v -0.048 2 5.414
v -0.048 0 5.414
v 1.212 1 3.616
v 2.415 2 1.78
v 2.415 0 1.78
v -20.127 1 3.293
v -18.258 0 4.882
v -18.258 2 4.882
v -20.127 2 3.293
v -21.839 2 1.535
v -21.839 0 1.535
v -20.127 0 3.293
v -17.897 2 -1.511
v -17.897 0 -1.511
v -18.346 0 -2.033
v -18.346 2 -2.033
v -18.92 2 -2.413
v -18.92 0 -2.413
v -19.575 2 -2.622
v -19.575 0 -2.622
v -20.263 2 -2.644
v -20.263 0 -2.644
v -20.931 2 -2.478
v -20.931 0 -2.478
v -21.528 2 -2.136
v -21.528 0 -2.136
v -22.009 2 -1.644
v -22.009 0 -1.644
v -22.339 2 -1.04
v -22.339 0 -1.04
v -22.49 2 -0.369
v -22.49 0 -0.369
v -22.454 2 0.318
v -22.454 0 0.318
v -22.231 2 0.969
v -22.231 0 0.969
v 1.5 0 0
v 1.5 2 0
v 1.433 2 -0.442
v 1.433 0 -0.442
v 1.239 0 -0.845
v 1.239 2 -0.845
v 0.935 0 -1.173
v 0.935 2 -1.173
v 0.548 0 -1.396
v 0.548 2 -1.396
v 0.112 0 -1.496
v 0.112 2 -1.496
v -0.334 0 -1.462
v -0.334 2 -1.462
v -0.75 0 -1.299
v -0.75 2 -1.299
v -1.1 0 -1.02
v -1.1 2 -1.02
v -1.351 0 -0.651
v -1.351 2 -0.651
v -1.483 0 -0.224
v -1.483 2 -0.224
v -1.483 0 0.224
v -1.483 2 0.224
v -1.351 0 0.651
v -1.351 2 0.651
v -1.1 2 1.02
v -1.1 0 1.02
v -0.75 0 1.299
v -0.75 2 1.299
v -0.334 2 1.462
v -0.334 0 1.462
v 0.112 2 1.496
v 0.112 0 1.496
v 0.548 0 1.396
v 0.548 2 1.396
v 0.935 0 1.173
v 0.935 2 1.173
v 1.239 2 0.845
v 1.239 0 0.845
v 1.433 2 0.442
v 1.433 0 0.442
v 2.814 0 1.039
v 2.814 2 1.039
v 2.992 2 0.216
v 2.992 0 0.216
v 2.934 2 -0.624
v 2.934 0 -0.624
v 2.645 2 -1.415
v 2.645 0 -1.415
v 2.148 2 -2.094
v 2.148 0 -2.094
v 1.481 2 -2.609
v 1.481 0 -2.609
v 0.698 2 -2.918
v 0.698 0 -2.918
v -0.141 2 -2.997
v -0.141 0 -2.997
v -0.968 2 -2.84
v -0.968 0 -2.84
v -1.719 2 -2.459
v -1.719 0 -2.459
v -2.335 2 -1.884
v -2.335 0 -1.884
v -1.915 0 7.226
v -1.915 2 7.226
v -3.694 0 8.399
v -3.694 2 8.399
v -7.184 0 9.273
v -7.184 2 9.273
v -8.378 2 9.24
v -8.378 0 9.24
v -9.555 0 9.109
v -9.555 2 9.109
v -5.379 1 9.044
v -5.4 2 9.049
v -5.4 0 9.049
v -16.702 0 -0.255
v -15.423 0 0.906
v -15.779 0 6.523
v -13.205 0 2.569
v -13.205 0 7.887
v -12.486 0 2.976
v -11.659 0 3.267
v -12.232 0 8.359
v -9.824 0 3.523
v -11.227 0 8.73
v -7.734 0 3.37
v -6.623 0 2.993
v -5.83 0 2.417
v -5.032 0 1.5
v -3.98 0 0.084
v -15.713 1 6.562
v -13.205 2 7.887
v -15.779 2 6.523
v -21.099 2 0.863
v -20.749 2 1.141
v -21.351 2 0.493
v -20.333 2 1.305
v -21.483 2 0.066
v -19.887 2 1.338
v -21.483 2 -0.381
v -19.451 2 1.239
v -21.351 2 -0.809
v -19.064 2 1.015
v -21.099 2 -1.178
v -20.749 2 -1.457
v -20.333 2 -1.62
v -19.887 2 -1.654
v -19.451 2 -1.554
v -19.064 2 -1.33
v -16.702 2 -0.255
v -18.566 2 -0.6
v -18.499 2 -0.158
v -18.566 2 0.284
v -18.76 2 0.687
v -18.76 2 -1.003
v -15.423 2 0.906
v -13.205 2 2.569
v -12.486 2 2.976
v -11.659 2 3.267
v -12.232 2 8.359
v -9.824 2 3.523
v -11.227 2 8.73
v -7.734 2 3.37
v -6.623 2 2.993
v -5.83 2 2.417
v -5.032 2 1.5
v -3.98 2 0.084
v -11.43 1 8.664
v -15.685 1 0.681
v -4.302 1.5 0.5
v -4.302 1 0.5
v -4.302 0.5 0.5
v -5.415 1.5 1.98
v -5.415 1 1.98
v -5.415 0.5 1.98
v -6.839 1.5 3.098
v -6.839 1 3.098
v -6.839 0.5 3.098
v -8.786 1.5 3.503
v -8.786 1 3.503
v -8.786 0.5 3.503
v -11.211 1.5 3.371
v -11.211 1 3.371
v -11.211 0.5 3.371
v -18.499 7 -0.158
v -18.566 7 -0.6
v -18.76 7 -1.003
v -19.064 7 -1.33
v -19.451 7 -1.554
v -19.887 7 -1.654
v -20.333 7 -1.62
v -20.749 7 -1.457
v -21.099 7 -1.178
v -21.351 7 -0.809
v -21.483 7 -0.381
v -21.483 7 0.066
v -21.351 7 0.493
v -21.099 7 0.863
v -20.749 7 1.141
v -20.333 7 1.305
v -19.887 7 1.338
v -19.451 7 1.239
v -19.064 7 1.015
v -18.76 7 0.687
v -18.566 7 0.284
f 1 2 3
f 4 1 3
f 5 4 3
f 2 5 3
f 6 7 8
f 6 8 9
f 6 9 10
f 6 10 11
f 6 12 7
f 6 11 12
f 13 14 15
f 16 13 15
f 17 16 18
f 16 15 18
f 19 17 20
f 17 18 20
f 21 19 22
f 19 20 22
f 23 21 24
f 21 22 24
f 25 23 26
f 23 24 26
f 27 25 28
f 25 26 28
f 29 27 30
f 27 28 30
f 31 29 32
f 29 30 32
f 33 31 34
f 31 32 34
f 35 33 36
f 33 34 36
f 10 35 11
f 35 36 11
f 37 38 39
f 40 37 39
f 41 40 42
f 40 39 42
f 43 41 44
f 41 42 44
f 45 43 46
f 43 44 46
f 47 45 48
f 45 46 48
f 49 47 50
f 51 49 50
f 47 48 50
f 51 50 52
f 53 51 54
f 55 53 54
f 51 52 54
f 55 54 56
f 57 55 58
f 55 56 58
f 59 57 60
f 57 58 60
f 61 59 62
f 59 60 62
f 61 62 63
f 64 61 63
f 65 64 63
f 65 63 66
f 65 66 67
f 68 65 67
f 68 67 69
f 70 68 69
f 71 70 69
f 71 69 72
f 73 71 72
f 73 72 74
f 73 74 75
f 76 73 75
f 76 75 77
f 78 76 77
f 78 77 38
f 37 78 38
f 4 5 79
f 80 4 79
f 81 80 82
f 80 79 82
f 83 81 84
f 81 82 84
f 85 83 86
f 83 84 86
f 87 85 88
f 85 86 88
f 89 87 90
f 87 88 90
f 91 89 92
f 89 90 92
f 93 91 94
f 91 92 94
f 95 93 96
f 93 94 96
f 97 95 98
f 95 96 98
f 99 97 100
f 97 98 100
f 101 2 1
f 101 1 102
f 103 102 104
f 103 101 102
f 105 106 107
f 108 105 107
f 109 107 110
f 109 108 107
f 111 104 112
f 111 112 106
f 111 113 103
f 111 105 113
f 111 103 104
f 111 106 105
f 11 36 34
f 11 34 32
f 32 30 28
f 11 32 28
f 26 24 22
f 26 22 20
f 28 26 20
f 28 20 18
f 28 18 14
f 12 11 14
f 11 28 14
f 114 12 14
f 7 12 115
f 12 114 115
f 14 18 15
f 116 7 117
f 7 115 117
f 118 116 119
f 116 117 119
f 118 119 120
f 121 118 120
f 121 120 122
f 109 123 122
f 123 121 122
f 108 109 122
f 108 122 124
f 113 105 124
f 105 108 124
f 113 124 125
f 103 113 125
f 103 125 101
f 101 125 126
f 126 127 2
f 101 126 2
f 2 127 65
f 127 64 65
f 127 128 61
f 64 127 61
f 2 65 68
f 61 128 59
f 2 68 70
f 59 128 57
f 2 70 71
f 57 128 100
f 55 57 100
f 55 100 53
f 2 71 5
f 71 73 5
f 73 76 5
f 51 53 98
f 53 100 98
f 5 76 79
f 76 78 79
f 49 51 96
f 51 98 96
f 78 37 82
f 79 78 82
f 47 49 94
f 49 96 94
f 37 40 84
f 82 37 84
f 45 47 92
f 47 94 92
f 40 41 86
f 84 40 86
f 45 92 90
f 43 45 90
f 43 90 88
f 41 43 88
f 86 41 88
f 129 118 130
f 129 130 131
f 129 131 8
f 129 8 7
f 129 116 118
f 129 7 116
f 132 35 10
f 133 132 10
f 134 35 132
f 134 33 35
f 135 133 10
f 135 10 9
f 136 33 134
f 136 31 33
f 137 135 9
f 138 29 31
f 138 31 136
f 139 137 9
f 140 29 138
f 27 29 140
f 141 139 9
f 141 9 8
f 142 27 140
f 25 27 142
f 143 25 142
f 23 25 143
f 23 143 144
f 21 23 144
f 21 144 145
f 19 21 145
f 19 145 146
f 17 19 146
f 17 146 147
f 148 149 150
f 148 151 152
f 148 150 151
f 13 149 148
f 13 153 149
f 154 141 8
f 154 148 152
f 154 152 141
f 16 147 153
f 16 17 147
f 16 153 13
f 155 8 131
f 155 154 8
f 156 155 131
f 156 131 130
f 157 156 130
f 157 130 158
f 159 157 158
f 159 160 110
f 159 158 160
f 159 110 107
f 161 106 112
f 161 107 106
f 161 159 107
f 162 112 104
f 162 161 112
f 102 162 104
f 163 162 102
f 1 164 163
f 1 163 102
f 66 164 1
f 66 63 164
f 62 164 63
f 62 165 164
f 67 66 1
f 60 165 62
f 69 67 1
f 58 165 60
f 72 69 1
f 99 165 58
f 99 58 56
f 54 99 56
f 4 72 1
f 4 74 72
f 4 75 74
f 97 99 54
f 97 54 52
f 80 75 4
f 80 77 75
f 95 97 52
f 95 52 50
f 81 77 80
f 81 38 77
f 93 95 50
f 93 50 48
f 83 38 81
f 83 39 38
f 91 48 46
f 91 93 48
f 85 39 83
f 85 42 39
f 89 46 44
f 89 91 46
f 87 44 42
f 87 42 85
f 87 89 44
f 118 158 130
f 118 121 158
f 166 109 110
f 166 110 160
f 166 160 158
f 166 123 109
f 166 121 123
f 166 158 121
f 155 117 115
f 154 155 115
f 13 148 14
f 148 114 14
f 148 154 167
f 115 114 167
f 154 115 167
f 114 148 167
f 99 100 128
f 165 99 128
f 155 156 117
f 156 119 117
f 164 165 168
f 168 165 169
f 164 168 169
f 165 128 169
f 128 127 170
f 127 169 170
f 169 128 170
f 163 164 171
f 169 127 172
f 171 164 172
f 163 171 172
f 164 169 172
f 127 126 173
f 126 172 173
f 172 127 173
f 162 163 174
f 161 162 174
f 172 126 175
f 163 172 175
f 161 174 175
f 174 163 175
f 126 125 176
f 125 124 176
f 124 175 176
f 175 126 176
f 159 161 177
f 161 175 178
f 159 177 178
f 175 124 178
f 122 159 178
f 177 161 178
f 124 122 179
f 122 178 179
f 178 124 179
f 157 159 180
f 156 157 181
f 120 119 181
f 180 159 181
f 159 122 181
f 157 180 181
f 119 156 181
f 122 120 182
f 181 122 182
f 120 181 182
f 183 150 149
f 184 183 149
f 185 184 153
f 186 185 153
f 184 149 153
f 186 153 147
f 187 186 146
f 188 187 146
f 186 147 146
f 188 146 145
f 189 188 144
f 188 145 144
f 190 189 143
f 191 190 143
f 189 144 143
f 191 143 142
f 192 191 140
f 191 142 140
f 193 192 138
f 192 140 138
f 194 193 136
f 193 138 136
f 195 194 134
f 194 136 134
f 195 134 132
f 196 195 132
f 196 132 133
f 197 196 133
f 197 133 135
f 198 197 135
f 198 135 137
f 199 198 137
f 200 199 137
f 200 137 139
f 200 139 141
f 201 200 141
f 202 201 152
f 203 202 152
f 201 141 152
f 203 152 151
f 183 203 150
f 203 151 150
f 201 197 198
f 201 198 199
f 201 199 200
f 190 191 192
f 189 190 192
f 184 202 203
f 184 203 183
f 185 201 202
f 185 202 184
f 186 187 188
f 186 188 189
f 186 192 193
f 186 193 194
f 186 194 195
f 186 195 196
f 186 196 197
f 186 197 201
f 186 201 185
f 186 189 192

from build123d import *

# Parameters (mm, degrees)
SALIENTE_EXTRUIR1_DEPTH = 2
CROQUIS2_R              = 1.5
CORTAR_EXTRUIR2_DEPTH   = 3
CROQUIS4_R              = 1.5
SALIENTE_EXTRUIR3_DEPTH = 5


with BuildPart() as part:
    # Croquis1 → Saliente-Extruir1 (new body)
    with BuildSketch(Plane(origin=(0, 0, 0), x_dir=(1, 0, 0), z_dir=(0, 1, 0))):
        with BuildLine():
            add(Edge.make_bspline(
                [(-0.047552943, -5.41433386), (1.239779979, -3.635052884), (2.414610314, -1.780353063)],
                knots=[0, 0, 0, 1, 1, 1], degree=2))
            ThreePointArc((2.414610314, -1.780353063), (1.832628676, 2.375178338), (-2.334614821, 1.88403122))
            add(Edge.make_bspline(
                [(-2.334614821, 1.88403122), (-2.951325259, 1.119828741), (-4.509299118, -0.563300275), (-5.988366098, -3.121312175), (-9.777324233, -3.72498405), (-12.108475468, -3.349116626), (-13.205411179, -2.56941452)],
                knots=[0, 0, 0, 0, 0.210355785, 0.457410568, 0.578047142, 0.870899615, 0.870899615, 0.870899615, 0.870899615], degree=3))
            add(Edge.make_bspline(
                [(-13.205411179, -2.56941452), (-15.819352109, -0.83375271), (-17.897343033, 1.511058614)],
                knots=[0, 0, 0, 1, 1, 1], degree=2))
            ThreePointArc((-17.897343033, 1.511058614), (-21.528082135, 2.135894472), (-21.839041513, -1.535071415))
            add(Edge.make_bspline(
                [(-18.257712787, -4.881966223), (-20.206095591, -3.376965901), (-21.839041513, -1.535071415)],
                knots=[0, 0, 0, 1, 1, 1], degree=2))
            add(Edge.make_bspline(
                [(-13.205411179, -7.886532608), (-14.054265837, -7.471831244), (-15.806738264, -6.580922778), (-17.428856772, -5.469594286), (-18.257712787, -4.881966223)],
                knots=[0, 0, 0, 0, 0.481848673, 1, 1, 1, 1], degree=3))
            add(Edge.make_bspline(
                [(-9.554936668, -9.109021082), (-11.480606525, -8.82957168), (-13.205411179, -7.886532608)],
                knots=[0, 0, 0, 1, 1, 1], degree=2))
            add(Edge.make_bspline(
                [(-0.047552943, -5.41433386), (-1.436995415, -7.008044472), (-4.467557841, -9.495004111), (-8.188902662, -9.306395591), (-9.554936668, -9.109021082)],
                knots=[0, 0, 0, 0, 0.608220397, 1, 1, 1, 1], degree=3))
        make_face()
    extrude(amount=SALIENTE_EXTRUIR1_DEPTH)

    # Croquis2 → Cortar-Extruir2 (cut)
    with BuildSketch(Plane(origin=(0, 2, 0), x_dir=(1, 0, 0), z_dir=(0, 1, 0))):
        Circle(CROQUIS2_R)
    extrude(amount=-CORTAR_EXTRUIR2_DEPTH, mode=Mode.SUBTRACT)

    # Croquis4 → Saliente-Extruir3 (add)
    with BuildSketch(Plane(origin=(0, 2, 0), x_dir=(1, 0, 0), z_dir=(0, 1, 0))):
        with Locations((-19.999377879, 0.157748042)):
            Circle(CROQUIS4_R)
    extrude(amount=SALIENTE_EXTRUIR3_DEPTH)


solid = part.part
